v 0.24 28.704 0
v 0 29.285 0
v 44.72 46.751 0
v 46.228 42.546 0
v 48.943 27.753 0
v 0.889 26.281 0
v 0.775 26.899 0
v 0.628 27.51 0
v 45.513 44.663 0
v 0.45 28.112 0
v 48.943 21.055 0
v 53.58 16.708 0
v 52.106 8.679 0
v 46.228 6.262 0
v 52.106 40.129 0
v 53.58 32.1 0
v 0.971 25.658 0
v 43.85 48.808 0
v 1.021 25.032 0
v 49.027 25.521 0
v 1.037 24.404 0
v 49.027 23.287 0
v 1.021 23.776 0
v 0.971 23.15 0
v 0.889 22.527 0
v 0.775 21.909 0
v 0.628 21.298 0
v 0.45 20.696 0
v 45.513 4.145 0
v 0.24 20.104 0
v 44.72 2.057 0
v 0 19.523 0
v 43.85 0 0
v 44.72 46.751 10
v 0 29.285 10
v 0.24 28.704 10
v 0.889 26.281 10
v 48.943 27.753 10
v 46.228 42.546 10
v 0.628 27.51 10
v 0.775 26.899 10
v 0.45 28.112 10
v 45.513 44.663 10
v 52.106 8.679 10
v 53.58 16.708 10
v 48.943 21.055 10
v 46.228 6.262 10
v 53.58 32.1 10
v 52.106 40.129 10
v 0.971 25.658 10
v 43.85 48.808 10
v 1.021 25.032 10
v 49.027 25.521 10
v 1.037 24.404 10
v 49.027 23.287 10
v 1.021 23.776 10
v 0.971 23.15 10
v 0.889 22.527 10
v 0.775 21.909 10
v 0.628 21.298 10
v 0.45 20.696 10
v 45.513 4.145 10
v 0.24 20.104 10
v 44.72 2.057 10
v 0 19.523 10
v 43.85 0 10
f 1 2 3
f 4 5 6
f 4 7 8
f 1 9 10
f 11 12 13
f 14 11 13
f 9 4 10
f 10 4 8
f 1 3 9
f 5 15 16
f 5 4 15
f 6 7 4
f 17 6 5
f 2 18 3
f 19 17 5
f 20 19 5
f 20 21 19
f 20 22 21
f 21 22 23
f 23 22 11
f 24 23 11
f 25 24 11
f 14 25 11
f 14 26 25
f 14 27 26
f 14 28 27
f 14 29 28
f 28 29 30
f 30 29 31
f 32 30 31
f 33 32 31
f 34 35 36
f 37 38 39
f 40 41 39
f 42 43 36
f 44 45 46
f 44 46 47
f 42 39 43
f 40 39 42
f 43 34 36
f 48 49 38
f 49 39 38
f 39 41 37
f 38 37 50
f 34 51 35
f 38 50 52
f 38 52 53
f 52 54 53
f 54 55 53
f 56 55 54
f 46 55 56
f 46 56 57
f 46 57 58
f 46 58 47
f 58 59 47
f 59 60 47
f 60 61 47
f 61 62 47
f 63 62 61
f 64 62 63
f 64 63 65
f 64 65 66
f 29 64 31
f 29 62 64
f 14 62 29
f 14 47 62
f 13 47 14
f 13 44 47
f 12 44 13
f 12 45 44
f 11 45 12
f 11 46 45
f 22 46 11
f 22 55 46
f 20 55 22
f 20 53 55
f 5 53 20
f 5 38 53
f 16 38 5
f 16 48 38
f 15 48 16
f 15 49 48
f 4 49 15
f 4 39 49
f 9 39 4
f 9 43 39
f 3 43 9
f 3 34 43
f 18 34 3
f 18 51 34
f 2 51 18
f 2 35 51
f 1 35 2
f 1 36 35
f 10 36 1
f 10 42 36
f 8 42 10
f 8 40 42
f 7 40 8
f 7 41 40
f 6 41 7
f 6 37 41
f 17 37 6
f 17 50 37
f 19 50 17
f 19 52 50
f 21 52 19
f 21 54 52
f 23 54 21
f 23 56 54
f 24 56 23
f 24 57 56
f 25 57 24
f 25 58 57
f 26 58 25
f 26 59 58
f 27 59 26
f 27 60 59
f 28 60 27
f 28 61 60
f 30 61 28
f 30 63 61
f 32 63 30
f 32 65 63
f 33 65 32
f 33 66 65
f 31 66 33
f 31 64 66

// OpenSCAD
$fn = 32;

// ----------------------------------------------------------------------
// Gear sector: 2 teeth on 48 degrees
// ----------------------------------------------------------------------

// --- parameters (mm) ---
sector_angle = 48;        // sector angle, degrees
root_r = 60;              // root circle radius
tooth_h = 5;              // tooth height over the root circle
teeth = 2;                // number of teeth on the sector
hub_r = 12;               // hub bore radius
plate_t = 10;             // sector thickness, Z
arc_step = 3;             // sampling step of the root/hub arcs, degrees

tip_r = root_r + tooth_h;  // tip circle radius

profile = [[43.85, 0], [44.72, 2.057], [45.513, 4.145], [46.228, 6.262], [52.106, 8.679], [53.58, 16.708], [48.943, 21.055], [49.027, 23.287], [49.027, 25.521], [48.943, 27.753], [53.58, 32.1], [52.106, 40.129], [46.228, 42.546], [45.513, 44.663], [44.72, 46.751], [43.85, 48.808], [0, 29.285], [0.24, 28.704], [0.45, 28.112], [0.628, 27.51], [0.775, 26.899], [0.889, 26.281], [0.971, 25.658], [1.021, 25.032], [1.037, 24.404], [1.021, 23.776], [0.971, 23.15], [0.889, 22.527], [0.775, 21.909], [0.628, 21.298], [0.45, 20.696], [0.24, 20.104], [0, 19.523]];  // primary outline, 33 points, counter clockwise

// --- the one profile operation ---
linear_extrude(height = plate_t) polygon(points = profile);
